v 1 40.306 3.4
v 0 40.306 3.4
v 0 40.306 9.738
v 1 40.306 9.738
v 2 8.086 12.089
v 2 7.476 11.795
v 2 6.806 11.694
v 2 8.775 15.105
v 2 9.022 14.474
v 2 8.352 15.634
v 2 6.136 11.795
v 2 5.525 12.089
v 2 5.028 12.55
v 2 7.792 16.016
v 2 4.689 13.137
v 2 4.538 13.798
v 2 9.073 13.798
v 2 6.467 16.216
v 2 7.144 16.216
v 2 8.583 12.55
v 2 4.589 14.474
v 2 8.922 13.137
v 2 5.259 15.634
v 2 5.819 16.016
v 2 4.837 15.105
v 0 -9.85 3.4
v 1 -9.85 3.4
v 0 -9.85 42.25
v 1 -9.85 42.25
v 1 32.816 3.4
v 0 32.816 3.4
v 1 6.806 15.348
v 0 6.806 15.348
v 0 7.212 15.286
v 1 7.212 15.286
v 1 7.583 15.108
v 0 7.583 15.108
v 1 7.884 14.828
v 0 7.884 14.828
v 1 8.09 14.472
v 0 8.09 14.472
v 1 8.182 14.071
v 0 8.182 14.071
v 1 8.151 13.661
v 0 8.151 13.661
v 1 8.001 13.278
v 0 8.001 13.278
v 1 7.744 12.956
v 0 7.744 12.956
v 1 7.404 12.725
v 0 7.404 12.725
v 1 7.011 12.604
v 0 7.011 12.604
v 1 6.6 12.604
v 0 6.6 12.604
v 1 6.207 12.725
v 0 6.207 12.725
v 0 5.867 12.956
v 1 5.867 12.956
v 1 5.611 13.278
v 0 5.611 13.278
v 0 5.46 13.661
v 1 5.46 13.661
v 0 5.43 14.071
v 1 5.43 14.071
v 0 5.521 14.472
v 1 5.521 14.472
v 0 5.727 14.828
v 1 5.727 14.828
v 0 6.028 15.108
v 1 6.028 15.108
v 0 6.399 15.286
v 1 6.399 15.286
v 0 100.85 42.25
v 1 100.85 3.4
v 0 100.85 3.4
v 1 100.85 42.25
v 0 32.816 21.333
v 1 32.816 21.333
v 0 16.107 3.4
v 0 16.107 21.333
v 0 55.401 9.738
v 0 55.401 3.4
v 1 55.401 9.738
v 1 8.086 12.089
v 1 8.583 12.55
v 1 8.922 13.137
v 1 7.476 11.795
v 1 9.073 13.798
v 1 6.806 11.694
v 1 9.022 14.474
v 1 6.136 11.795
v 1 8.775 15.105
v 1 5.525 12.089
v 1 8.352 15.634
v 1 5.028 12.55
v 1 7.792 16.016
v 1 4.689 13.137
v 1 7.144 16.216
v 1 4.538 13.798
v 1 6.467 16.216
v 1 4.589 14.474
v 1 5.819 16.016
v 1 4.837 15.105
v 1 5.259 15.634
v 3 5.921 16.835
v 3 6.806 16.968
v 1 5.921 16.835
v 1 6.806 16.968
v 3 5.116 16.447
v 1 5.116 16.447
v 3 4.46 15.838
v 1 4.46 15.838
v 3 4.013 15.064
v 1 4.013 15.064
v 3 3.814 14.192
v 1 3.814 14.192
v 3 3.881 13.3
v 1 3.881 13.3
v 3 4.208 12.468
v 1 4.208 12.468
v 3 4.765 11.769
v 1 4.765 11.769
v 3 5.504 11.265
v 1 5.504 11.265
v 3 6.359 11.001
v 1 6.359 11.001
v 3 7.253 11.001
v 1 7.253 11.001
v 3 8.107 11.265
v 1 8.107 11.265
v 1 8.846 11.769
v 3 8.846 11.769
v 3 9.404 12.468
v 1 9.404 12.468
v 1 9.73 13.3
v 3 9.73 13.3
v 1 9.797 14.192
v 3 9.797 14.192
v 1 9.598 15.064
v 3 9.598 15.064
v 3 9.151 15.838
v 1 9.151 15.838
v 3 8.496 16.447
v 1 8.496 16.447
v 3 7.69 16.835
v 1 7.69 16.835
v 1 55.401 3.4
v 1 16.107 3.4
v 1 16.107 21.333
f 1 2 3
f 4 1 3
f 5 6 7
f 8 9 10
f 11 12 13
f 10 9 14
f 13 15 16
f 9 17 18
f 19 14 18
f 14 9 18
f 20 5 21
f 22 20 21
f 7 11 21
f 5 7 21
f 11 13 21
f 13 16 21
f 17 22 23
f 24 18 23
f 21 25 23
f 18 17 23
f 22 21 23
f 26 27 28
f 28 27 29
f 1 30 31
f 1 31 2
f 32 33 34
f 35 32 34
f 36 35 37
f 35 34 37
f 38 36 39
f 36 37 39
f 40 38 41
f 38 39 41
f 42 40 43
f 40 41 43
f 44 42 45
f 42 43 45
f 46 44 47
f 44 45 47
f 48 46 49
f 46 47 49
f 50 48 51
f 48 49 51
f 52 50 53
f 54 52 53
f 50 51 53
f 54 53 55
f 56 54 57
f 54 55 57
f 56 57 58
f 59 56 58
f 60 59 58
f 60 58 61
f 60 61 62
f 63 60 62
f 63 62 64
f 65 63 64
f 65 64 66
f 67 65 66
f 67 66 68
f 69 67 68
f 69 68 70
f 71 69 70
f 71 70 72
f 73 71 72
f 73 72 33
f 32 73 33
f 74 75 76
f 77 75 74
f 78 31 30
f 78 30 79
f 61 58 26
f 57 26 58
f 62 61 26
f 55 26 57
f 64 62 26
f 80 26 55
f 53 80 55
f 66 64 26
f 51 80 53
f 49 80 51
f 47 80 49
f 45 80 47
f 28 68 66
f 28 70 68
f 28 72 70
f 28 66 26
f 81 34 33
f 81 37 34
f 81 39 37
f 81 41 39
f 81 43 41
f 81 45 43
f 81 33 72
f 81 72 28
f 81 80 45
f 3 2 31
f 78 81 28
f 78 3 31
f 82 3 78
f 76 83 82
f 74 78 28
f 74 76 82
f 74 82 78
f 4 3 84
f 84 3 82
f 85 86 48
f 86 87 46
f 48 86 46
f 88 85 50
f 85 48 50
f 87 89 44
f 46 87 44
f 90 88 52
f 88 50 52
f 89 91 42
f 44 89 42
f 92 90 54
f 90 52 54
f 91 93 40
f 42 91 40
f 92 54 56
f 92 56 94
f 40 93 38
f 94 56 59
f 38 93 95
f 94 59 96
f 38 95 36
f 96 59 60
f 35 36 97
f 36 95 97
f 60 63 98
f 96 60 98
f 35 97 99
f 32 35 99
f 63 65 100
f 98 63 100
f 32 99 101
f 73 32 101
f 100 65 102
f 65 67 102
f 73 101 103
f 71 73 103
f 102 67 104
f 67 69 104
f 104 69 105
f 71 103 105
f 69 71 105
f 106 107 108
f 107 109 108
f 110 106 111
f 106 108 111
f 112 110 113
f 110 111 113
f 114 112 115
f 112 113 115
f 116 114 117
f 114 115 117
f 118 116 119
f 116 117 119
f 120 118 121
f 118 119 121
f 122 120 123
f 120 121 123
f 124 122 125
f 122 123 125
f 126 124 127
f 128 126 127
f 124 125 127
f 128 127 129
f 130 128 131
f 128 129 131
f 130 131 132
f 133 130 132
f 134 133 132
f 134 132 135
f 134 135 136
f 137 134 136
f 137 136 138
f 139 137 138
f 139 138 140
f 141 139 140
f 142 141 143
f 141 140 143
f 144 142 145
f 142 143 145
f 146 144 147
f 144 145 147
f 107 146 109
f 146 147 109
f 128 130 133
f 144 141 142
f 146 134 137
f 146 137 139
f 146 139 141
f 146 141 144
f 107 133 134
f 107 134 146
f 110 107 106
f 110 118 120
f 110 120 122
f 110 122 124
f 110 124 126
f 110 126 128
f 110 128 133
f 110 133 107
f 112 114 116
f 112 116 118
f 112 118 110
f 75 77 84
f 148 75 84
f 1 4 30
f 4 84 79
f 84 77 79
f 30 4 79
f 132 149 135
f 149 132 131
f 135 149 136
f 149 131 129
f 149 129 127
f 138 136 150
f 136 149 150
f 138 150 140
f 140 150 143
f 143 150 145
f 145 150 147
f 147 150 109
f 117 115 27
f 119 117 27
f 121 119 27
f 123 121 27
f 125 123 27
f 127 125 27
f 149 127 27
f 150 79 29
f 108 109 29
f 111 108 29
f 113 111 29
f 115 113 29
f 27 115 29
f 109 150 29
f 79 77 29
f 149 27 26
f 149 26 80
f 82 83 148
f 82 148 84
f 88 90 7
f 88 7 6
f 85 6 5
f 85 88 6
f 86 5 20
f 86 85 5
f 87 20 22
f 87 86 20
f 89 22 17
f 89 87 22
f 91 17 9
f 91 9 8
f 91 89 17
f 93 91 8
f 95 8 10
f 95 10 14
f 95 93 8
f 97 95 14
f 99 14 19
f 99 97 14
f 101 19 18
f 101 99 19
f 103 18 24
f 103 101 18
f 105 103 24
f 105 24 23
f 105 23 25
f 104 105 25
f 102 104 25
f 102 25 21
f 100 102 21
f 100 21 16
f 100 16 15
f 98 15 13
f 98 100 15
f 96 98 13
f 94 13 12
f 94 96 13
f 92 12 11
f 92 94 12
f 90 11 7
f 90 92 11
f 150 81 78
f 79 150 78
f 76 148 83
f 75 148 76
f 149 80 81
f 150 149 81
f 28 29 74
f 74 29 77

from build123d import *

# Parameters (mm, degrees)
SKETCH_1_W          = 110.7
SKETCH_1_H          = 38.85
EXTRUDE_1_DEPTH     = 0.5
SKETCH_2_W          = 38.85
SKETCH_2_H          = 110.7
EXTRUDE_2_DEPTH     = 0.5
SKETCH_3_W          = 17.932827047
SKETCH_3_H          = 16.708777413
CUT_EXTRUDE_1_DEPTH = 10
SKETCH_4_W          = 6.338485403
SKETCH_4_H          = 15.09561221
CUT_EXTRUDE_2_DEPTH = 3
SKETCH_5_R          = 1.379738623
CUT_EXTRUDE_3_DEPTH = 3
SKETCH_6_R          = 3.000043017
SKETCH_6_R_2        = 2.273503066
EXTRUDE_3_DEPTH     = 1
SKETCH_7_R          = 3.000043017
EXTRUDE_4_DEPTH     = 1


with BuildPart() as part:
    # Эскиз1 → Бобышка-Вытянуть1 (new body)
    with BuildSketch(Plane(origin=(0.5, 0, 0), x_dir=(0, -1, 0), z_dir=(-1, 0, 0))):
        with Locations((-45.5, 22.825)):
            Rectangle(SKETCH_1_W, SKETCH_1_H)
    extrude(amount=-EXTRUDE_1_DEPTH)

    # Эскиз2 → Бобышка-Вытянуть2 (add)
    with BuildSketch(Plane.ZY.offset(-0.5)):
        with Locations((22.825, 45.5)):
            Rectangle(SKETCH_2_W, SKETCH_2_H)
    extrude(amount=EXTRUDE_2_DEPTH)

    # Эскиз3 → Вырез-Вытянуть1 (cut)
    with BuildSketch(Plane.ZY):
        with Locations((12.366413524, 24.461489881)):
            Rectangle(SKETCH_3_W, SKETCH_3_H)
    extrude(amount=-CUT_EXTRUDE_1_DEPTH, mode=Mode.SUBTRACT)

    # Эскиз4 → Вырез-Вытянуть2 (cut)
    with BuildSketch(Plane.ZY):
        with Locations((6.569242702, 47.853484542)):
            Rectangle(SKETCH_4_W, SKETCH_4_H)
    extrude(amount=-CUT_EXTRUDE_2_DEPTH, mode=Mode.SUBTRACT)

    # Эскиз5 → Вырез-Вытянуть3 (cut)
    with BuildSketch(Plane.ZY):
        with Locations((13.967872297, 6.805635325)):
            Circle(SKETCH_5_R)
    extrude(amount=-CUT_EXTRUDE_3_DEPTH, mode=Mode.SUBTRACT)

    # Эскиз6 → Бобышка-Вытянуть3 (add)
    with BuildSketch(Plane(origin=(1, 0, 0), x_dir=(0, 0, -1), z_dir=(1, 0, 0))):
        with Locations(Location((-13.967872297, 6.805635325, 0), (0, 0, 180))):
            Circle(SKETCH_6_R)
        with Locations((-13.967872297, 6.805635325)):
            Circle(SKETCH_6_R_2, mode=Mode.SUBTRACT)
    extrude(amount=EXTRUDE_3_DEPTH)

    # Эскиз7 → Бобышка-Вытянуть4 (add)
    with BuildSketch(Plane(origin=(2, 0, 0), x_dir=(0, 0, -1), z_dir=(1, 0, 0))):
        with Locations(Location((-13.967872297, 6.805635325, 0), (0, 0, 180))):
            Circle(SKETCH_7_R)
    extrude(amount=EXTRUDE_4_DEPTH)


solid = part.part
